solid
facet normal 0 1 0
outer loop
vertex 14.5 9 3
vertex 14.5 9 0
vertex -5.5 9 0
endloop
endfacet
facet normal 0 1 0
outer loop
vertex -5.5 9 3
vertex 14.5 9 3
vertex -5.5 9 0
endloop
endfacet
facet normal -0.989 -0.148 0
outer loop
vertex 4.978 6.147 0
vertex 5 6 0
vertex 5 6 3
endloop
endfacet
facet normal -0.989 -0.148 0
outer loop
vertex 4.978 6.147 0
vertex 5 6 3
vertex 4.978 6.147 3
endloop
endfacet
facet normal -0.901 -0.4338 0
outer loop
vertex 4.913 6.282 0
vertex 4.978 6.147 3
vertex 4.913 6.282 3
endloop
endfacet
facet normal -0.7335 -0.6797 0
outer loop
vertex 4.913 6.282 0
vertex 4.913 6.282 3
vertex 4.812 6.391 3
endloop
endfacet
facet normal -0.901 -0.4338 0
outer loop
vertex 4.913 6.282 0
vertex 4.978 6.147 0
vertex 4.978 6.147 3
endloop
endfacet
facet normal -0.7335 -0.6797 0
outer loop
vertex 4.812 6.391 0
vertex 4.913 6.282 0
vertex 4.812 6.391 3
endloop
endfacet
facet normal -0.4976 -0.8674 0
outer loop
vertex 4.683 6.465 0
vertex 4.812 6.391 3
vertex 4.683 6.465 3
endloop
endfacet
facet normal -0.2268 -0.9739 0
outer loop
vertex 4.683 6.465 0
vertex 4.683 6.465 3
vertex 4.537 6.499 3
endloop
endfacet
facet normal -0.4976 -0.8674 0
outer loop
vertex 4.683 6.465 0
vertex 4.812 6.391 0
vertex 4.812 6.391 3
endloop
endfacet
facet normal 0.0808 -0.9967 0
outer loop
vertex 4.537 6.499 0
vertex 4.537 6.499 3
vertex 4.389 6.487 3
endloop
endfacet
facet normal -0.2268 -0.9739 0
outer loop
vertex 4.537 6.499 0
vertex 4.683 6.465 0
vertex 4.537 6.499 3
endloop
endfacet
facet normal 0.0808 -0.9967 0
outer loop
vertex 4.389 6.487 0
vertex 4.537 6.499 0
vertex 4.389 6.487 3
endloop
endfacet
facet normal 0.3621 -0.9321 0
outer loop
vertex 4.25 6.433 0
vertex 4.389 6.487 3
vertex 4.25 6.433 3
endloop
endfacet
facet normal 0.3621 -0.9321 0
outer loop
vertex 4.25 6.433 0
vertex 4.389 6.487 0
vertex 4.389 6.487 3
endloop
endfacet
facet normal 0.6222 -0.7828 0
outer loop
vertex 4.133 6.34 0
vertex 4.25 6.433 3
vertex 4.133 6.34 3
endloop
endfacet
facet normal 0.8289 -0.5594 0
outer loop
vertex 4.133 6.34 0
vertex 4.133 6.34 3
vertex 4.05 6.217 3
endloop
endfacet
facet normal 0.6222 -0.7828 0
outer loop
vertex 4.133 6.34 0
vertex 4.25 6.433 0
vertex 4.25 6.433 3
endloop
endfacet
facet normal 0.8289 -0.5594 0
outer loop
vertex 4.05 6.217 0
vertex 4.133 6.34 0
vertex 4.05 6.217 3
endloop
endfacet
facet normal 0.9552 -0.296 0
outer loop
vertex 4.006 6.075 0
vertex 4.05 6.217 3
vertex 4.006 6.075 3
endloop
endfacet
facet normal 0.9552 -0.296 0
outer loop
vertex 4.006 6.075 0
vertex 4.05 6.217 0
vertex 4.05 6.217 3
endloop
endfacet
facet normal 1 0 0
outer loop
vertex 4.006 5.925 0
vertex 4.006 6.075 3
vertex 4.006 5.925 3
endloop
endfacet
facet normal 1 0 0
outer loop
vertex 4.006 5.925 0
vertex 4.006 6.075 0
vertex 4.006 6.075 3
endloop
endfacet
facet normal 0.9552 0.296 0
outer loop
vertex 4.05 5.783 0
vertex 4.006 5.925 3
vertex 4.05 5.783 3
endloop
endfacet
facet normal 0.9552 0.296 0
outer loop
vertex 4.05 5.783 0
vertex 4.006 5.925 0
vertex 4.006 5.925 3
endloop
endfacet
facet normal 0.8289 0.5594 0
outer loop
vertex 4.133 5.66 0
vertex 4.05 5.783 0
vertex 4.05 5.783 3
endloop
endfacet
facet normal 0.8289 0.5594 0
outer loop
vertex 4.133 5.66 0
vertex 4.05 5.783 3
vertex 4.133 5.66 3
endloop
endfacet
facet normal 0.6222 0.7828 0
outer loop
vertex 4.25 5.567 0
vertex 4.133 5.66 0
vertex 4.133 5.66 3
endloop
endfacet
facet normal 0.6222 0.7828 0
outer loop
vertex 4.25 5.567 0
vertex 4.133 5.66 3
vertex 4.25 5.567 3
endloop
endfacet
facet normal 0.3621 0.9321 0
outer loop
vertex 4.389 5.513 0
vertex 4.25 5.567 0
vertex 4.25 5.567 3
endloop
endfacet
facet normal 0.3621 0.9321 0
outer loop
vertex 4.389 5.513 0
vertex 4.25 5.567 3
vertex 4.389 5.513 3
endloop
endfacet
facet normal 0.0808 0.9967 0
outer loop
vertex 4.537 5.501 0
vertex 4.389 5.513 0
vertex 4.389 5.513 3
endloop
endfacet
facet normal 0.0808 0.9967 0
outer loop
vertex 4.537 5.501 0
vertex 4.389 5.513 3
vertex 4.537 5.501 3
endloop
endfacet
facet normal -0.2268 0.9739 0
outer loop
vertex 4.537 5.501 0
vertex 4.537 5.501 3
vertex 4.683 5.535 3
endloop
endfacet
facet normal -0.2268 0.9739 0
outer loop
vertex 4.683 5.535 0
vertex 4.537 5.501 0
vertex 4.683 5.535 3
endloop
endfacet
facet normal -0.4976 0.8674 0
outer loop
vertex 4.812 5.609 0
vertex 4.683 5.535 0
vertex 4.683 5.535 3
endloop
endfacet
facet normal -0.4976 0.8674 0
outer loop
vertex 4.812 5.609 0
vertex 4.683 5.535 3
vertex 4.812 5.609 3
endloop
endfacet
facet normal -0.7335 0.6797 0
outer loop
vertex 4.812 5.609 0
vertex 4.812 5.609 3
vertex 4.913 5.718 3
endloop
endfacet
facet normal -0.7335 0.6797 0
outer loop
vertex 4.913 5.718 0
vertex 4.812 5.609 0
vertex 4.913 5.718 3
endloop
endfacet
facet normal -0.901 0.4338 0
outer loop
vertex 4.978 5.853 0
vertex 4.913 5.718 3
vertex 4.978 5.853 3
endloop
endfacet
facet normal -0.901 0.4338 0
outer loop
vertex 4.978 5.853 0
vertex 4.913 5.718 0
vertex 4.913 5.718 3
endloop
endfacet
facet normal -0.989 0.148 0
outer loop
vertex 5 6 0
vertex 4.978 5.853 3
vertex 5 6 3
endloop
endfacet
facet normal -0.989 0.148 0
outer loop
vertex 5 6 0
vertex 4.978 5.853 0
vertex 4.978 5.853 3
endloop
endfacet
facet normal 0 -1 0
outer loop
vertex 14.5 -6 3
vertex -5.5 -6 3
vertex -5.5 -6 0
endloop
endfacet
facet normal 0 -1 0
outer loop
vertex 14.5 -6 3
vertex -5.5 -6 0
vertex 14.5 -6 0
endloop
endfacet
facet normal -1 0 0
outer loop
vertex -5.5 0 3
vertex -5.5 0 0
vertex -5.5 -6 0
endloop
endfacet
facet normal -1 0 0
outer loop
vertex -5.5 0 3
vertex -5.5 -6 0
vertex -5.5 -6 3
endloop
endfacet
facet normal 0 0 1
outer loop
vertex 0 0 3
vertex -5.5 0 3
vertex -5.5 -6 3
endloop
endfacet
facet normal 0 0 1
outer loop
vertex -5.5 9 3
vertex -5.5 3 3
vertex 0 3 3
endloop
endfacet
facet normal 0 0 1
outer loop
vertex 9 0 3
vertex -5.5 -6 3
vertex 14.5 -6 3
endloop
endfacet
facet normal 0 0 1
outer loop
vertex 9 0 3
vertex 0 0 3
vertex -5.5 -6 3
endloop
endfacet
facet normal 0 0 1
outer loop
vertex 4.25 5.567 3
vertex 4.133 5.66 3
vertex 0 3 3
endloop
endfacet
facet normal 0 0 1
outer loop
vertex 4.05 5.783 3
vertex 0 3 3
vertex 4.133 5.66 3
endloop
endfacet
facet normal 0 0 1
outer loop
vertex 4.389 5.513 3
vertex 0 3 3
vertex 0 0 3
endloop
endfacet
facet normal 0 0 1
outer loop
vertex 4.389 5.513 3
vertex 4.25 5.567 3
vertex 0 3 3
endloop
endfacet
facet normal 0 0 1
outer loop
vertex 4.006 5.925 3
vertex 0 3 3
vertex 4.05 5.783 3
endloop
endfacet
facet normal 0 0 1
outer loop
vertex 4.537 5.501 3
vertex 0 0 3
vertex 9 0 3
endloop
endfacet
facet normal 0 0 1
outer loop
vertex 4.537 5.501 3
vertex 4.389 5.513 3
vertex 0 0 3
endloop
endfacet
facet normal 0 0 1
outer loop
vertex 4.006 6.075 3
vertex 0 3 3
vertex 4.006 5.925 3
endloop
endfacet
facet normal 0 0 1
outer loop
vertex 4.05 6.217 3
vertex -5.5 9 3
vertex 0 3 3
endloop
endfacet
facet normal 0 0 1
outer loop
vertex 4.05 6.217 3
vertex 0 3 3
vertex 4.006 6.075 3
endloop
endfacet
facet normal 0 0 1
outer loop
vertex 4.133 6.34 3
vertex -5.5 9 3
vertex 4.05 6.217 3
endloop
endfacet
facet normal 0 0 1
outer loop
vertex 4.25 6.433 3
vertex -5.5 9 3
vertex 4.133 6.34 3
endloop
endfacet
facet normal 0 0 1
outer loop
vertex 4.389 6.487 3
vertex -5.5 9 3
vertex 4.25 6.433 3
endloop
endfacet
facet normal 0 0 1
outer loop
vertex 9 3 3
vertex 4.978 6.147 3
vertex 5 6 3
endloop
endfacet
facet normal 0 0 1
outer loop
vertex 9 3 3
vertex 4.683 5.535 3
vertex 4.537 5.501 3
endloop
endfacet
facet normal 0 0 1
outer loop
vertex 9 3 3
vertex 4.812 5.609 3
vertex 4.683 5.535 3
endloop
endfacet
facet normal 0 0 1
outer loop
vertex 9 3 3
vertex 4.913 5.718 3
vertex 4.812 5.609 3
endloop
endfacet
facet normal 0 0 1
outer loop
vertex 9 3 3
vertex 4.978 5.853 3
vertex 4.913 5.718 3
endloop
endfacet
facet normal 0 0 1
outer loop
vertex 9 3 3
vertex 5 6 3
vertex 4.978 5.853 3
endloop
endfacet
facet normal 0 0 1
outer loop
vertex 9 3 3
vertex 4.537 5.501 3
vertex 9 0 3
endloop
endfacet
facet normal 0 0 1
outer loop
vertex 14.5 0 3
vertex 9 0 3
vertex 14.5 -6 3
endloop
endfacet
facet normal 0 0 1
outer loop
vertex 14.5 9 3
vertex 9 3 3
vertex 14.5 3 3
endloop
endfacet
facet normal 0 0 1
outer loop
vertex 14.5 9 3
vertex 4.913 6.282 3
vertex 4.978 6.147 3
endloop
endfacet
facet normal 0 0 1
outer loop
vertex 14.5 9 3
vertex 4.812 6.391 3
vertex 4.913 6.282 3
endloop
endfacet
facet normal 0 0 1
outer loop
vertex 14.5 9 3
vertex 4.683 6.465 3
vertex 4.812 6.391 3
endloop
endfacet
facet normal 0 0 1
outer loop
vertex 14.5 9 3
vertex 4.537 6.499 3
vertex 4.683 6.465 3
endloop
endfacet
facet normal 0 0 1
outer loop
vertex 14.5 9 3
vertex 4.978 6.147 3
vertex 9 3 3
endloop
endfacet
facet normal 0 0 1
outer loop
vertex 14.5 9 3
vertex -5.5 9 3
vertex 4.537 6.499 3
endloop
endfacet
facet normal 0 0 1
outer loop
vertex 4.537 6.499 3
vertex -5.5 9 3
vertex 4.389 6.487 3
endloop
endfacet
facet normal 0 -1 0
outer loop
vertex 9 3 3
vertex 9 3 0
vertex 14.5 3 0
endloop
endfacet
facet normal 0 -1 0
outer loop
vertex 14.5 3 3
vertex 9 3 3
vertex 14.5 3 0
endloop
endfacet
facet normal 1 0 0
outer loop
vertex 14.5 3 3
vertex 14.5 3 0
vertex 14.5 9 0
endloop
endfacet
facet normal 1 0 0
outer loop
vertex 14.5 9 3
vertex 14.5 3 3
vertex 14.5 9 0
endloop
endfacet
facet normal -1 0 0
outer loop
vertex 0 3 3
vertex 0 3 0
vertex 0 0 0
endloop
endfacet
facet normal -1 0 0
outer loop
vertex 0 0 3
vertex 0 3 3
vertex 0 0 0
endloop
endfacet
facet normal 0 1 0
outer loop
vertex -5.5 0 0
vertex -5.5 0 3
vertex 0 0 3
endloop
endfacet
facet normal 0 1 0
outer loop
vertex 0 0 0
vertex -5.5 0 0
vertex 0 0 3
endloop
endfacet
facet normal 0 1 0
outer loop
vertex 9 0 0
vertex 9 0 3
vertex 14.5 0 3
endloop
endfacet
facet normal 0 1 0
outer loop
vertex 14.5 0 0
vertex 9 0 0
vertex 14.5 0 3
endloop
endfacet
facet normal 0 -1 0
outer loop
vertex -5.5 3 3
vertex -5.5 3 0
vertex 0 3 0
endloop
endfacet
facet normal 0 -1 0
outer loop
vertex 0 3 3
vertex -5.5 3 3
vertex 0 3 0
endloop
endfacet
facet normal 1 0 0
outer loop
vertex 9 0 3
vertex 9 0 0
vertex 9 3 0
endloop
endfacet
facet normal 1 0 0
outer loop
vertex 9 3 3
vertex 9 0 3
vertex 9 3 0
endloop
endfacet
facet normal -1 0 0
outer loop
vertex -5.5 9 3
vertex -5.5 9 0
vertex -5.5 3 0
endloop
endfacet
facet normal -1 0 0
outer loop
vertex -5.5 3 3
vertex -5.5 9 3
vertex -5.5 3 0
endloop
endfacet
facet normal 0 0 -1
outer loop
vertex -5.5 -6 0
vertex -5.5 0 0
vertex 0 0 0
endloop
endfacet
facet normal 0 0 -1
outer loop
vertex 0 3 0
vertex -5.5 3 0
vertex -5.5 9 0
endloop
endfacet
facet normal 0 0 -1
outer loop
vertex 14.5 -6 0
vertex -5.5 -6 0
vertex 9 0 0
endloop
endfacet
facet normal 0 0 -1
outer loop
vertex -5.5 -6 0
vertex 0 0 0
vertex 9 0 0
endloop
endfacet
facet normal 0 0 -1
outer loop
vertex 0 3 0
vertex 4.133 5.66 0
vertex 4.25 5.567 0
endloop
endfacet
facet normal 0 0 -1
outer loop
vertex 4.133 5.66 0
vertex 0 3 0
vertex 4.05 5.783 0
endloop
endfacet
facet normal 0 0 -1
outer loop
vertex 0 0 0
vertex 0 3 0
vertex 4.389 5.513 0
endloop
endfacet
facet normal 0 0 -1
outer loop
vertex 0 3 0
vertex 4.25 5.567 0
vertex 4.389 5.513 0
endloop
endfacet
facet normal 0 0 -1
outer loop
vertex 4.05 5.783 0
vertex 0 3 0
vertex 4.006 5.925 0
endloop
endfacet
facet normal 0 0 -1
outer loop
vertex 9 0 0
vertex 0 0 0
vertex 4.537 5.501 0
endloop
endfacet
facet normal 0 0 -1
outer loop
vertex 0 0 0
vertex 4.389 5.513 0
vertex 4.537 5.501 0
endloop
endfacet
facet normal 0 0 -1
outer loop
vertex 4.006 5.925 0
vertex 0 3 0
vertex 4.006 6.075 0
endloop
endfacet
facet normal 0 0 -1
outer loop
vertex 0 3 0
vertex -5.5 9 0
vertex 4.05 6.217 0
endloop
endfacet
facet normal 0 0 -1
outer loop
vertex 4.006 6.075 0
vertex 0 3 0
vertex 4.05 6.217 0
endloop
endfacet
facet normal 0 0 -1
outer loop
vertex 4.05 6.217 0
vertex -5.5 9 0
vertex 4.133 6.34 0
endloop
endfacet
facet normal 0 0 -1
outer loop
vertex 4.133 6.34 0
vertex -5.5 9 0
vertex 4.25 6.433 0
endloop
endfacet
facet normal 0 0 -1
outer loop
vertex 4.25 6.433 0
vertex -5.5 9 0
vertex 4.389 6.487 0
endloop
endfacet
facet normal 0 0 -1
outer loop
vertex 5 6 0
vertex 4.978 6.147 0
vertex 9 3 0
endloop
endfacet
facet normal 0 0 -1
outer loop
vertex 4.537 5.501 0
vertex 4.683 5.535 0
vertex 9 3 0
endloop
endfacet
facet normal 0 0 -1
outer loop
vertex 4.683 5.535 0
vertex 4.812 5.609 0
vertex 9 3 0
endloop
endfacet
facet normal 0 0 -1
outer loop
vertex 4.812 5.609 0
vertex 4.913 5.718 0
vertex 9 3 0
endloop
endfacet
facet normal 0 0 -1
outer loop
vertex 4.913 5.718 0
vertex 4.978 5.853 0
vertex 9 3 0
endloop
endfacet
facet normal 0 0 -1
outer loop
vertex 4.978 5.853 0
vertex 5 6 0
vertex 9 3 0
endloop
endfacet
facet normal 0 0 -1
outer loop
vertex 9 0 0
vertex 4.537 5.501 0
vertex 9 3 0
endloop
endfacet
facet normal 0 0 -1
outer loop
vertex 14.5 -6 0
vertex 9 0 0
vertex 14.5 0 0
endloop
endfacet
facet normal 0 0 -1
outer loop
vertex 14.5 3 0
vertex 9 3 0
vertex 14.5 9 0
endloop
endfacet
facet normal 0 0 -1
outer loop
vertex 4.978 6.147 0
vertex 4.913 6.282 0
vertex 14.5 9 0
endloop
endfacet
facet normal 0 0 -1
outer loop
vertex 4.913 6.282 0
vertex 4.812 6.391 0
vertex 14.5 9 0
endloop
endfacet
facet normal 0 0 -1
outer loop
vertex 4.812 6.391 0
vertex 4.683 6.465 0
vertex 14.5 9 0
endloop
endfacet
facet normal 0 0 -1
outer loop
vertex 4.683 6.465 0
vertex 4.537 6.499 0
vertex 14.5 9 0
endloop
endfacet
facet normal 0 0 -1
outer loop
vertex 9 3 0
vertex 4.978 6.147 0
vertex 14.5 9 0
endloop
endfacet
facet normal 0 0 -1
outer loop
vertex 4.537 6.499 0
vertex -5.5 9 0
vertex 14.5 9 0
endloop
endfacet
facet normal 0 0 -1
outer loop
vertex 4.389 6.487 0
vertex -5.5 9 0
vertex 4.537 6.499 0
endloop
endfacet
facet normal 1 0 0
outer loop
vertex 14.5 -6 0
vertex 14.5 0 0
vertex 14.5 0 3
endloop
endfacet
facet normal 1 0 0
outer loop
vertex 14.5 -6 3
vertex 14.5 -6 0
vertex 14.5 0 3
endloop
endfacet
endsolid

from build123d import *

# Parameters (mm, degrees)
SKETCH1_R           = 0.5
BOSS_EXTRUDE1_DEPTH = 3
SKETCH2_W           = 20
SKETCH2_H           = 3
BOSS_EXTRUDE2_DEPTH = 6


with BuildPart() as part:
    # Sketch1 → Boss-Extrude1 (new body)
    with BuildSketch(Plane.XY):
        Polygon((0, 0), (9, 0), (9, 3), (14.5, 3), (14.5, 9), (-5.5, 9), (-5.5, 3), (0, 3), align=None)
        with Locations((4.5, 6)):
            Circle(SKETCH1_R, mode=Mode.SUBTRACT)
    extrude(amount=BOSS_EXTRUDE1_DEPTH)

    # Sketch2 → Boss-Extrude2 (add)
    with BuildSketch(Plane.XZ):
        with Locations((4.5, 1.5)):
            Rectangle(SKETCH2_W, SKETCH2_H)
    extrude(amount=BOSS_EXTRUDE2_DEPTH)


solid = part.part
